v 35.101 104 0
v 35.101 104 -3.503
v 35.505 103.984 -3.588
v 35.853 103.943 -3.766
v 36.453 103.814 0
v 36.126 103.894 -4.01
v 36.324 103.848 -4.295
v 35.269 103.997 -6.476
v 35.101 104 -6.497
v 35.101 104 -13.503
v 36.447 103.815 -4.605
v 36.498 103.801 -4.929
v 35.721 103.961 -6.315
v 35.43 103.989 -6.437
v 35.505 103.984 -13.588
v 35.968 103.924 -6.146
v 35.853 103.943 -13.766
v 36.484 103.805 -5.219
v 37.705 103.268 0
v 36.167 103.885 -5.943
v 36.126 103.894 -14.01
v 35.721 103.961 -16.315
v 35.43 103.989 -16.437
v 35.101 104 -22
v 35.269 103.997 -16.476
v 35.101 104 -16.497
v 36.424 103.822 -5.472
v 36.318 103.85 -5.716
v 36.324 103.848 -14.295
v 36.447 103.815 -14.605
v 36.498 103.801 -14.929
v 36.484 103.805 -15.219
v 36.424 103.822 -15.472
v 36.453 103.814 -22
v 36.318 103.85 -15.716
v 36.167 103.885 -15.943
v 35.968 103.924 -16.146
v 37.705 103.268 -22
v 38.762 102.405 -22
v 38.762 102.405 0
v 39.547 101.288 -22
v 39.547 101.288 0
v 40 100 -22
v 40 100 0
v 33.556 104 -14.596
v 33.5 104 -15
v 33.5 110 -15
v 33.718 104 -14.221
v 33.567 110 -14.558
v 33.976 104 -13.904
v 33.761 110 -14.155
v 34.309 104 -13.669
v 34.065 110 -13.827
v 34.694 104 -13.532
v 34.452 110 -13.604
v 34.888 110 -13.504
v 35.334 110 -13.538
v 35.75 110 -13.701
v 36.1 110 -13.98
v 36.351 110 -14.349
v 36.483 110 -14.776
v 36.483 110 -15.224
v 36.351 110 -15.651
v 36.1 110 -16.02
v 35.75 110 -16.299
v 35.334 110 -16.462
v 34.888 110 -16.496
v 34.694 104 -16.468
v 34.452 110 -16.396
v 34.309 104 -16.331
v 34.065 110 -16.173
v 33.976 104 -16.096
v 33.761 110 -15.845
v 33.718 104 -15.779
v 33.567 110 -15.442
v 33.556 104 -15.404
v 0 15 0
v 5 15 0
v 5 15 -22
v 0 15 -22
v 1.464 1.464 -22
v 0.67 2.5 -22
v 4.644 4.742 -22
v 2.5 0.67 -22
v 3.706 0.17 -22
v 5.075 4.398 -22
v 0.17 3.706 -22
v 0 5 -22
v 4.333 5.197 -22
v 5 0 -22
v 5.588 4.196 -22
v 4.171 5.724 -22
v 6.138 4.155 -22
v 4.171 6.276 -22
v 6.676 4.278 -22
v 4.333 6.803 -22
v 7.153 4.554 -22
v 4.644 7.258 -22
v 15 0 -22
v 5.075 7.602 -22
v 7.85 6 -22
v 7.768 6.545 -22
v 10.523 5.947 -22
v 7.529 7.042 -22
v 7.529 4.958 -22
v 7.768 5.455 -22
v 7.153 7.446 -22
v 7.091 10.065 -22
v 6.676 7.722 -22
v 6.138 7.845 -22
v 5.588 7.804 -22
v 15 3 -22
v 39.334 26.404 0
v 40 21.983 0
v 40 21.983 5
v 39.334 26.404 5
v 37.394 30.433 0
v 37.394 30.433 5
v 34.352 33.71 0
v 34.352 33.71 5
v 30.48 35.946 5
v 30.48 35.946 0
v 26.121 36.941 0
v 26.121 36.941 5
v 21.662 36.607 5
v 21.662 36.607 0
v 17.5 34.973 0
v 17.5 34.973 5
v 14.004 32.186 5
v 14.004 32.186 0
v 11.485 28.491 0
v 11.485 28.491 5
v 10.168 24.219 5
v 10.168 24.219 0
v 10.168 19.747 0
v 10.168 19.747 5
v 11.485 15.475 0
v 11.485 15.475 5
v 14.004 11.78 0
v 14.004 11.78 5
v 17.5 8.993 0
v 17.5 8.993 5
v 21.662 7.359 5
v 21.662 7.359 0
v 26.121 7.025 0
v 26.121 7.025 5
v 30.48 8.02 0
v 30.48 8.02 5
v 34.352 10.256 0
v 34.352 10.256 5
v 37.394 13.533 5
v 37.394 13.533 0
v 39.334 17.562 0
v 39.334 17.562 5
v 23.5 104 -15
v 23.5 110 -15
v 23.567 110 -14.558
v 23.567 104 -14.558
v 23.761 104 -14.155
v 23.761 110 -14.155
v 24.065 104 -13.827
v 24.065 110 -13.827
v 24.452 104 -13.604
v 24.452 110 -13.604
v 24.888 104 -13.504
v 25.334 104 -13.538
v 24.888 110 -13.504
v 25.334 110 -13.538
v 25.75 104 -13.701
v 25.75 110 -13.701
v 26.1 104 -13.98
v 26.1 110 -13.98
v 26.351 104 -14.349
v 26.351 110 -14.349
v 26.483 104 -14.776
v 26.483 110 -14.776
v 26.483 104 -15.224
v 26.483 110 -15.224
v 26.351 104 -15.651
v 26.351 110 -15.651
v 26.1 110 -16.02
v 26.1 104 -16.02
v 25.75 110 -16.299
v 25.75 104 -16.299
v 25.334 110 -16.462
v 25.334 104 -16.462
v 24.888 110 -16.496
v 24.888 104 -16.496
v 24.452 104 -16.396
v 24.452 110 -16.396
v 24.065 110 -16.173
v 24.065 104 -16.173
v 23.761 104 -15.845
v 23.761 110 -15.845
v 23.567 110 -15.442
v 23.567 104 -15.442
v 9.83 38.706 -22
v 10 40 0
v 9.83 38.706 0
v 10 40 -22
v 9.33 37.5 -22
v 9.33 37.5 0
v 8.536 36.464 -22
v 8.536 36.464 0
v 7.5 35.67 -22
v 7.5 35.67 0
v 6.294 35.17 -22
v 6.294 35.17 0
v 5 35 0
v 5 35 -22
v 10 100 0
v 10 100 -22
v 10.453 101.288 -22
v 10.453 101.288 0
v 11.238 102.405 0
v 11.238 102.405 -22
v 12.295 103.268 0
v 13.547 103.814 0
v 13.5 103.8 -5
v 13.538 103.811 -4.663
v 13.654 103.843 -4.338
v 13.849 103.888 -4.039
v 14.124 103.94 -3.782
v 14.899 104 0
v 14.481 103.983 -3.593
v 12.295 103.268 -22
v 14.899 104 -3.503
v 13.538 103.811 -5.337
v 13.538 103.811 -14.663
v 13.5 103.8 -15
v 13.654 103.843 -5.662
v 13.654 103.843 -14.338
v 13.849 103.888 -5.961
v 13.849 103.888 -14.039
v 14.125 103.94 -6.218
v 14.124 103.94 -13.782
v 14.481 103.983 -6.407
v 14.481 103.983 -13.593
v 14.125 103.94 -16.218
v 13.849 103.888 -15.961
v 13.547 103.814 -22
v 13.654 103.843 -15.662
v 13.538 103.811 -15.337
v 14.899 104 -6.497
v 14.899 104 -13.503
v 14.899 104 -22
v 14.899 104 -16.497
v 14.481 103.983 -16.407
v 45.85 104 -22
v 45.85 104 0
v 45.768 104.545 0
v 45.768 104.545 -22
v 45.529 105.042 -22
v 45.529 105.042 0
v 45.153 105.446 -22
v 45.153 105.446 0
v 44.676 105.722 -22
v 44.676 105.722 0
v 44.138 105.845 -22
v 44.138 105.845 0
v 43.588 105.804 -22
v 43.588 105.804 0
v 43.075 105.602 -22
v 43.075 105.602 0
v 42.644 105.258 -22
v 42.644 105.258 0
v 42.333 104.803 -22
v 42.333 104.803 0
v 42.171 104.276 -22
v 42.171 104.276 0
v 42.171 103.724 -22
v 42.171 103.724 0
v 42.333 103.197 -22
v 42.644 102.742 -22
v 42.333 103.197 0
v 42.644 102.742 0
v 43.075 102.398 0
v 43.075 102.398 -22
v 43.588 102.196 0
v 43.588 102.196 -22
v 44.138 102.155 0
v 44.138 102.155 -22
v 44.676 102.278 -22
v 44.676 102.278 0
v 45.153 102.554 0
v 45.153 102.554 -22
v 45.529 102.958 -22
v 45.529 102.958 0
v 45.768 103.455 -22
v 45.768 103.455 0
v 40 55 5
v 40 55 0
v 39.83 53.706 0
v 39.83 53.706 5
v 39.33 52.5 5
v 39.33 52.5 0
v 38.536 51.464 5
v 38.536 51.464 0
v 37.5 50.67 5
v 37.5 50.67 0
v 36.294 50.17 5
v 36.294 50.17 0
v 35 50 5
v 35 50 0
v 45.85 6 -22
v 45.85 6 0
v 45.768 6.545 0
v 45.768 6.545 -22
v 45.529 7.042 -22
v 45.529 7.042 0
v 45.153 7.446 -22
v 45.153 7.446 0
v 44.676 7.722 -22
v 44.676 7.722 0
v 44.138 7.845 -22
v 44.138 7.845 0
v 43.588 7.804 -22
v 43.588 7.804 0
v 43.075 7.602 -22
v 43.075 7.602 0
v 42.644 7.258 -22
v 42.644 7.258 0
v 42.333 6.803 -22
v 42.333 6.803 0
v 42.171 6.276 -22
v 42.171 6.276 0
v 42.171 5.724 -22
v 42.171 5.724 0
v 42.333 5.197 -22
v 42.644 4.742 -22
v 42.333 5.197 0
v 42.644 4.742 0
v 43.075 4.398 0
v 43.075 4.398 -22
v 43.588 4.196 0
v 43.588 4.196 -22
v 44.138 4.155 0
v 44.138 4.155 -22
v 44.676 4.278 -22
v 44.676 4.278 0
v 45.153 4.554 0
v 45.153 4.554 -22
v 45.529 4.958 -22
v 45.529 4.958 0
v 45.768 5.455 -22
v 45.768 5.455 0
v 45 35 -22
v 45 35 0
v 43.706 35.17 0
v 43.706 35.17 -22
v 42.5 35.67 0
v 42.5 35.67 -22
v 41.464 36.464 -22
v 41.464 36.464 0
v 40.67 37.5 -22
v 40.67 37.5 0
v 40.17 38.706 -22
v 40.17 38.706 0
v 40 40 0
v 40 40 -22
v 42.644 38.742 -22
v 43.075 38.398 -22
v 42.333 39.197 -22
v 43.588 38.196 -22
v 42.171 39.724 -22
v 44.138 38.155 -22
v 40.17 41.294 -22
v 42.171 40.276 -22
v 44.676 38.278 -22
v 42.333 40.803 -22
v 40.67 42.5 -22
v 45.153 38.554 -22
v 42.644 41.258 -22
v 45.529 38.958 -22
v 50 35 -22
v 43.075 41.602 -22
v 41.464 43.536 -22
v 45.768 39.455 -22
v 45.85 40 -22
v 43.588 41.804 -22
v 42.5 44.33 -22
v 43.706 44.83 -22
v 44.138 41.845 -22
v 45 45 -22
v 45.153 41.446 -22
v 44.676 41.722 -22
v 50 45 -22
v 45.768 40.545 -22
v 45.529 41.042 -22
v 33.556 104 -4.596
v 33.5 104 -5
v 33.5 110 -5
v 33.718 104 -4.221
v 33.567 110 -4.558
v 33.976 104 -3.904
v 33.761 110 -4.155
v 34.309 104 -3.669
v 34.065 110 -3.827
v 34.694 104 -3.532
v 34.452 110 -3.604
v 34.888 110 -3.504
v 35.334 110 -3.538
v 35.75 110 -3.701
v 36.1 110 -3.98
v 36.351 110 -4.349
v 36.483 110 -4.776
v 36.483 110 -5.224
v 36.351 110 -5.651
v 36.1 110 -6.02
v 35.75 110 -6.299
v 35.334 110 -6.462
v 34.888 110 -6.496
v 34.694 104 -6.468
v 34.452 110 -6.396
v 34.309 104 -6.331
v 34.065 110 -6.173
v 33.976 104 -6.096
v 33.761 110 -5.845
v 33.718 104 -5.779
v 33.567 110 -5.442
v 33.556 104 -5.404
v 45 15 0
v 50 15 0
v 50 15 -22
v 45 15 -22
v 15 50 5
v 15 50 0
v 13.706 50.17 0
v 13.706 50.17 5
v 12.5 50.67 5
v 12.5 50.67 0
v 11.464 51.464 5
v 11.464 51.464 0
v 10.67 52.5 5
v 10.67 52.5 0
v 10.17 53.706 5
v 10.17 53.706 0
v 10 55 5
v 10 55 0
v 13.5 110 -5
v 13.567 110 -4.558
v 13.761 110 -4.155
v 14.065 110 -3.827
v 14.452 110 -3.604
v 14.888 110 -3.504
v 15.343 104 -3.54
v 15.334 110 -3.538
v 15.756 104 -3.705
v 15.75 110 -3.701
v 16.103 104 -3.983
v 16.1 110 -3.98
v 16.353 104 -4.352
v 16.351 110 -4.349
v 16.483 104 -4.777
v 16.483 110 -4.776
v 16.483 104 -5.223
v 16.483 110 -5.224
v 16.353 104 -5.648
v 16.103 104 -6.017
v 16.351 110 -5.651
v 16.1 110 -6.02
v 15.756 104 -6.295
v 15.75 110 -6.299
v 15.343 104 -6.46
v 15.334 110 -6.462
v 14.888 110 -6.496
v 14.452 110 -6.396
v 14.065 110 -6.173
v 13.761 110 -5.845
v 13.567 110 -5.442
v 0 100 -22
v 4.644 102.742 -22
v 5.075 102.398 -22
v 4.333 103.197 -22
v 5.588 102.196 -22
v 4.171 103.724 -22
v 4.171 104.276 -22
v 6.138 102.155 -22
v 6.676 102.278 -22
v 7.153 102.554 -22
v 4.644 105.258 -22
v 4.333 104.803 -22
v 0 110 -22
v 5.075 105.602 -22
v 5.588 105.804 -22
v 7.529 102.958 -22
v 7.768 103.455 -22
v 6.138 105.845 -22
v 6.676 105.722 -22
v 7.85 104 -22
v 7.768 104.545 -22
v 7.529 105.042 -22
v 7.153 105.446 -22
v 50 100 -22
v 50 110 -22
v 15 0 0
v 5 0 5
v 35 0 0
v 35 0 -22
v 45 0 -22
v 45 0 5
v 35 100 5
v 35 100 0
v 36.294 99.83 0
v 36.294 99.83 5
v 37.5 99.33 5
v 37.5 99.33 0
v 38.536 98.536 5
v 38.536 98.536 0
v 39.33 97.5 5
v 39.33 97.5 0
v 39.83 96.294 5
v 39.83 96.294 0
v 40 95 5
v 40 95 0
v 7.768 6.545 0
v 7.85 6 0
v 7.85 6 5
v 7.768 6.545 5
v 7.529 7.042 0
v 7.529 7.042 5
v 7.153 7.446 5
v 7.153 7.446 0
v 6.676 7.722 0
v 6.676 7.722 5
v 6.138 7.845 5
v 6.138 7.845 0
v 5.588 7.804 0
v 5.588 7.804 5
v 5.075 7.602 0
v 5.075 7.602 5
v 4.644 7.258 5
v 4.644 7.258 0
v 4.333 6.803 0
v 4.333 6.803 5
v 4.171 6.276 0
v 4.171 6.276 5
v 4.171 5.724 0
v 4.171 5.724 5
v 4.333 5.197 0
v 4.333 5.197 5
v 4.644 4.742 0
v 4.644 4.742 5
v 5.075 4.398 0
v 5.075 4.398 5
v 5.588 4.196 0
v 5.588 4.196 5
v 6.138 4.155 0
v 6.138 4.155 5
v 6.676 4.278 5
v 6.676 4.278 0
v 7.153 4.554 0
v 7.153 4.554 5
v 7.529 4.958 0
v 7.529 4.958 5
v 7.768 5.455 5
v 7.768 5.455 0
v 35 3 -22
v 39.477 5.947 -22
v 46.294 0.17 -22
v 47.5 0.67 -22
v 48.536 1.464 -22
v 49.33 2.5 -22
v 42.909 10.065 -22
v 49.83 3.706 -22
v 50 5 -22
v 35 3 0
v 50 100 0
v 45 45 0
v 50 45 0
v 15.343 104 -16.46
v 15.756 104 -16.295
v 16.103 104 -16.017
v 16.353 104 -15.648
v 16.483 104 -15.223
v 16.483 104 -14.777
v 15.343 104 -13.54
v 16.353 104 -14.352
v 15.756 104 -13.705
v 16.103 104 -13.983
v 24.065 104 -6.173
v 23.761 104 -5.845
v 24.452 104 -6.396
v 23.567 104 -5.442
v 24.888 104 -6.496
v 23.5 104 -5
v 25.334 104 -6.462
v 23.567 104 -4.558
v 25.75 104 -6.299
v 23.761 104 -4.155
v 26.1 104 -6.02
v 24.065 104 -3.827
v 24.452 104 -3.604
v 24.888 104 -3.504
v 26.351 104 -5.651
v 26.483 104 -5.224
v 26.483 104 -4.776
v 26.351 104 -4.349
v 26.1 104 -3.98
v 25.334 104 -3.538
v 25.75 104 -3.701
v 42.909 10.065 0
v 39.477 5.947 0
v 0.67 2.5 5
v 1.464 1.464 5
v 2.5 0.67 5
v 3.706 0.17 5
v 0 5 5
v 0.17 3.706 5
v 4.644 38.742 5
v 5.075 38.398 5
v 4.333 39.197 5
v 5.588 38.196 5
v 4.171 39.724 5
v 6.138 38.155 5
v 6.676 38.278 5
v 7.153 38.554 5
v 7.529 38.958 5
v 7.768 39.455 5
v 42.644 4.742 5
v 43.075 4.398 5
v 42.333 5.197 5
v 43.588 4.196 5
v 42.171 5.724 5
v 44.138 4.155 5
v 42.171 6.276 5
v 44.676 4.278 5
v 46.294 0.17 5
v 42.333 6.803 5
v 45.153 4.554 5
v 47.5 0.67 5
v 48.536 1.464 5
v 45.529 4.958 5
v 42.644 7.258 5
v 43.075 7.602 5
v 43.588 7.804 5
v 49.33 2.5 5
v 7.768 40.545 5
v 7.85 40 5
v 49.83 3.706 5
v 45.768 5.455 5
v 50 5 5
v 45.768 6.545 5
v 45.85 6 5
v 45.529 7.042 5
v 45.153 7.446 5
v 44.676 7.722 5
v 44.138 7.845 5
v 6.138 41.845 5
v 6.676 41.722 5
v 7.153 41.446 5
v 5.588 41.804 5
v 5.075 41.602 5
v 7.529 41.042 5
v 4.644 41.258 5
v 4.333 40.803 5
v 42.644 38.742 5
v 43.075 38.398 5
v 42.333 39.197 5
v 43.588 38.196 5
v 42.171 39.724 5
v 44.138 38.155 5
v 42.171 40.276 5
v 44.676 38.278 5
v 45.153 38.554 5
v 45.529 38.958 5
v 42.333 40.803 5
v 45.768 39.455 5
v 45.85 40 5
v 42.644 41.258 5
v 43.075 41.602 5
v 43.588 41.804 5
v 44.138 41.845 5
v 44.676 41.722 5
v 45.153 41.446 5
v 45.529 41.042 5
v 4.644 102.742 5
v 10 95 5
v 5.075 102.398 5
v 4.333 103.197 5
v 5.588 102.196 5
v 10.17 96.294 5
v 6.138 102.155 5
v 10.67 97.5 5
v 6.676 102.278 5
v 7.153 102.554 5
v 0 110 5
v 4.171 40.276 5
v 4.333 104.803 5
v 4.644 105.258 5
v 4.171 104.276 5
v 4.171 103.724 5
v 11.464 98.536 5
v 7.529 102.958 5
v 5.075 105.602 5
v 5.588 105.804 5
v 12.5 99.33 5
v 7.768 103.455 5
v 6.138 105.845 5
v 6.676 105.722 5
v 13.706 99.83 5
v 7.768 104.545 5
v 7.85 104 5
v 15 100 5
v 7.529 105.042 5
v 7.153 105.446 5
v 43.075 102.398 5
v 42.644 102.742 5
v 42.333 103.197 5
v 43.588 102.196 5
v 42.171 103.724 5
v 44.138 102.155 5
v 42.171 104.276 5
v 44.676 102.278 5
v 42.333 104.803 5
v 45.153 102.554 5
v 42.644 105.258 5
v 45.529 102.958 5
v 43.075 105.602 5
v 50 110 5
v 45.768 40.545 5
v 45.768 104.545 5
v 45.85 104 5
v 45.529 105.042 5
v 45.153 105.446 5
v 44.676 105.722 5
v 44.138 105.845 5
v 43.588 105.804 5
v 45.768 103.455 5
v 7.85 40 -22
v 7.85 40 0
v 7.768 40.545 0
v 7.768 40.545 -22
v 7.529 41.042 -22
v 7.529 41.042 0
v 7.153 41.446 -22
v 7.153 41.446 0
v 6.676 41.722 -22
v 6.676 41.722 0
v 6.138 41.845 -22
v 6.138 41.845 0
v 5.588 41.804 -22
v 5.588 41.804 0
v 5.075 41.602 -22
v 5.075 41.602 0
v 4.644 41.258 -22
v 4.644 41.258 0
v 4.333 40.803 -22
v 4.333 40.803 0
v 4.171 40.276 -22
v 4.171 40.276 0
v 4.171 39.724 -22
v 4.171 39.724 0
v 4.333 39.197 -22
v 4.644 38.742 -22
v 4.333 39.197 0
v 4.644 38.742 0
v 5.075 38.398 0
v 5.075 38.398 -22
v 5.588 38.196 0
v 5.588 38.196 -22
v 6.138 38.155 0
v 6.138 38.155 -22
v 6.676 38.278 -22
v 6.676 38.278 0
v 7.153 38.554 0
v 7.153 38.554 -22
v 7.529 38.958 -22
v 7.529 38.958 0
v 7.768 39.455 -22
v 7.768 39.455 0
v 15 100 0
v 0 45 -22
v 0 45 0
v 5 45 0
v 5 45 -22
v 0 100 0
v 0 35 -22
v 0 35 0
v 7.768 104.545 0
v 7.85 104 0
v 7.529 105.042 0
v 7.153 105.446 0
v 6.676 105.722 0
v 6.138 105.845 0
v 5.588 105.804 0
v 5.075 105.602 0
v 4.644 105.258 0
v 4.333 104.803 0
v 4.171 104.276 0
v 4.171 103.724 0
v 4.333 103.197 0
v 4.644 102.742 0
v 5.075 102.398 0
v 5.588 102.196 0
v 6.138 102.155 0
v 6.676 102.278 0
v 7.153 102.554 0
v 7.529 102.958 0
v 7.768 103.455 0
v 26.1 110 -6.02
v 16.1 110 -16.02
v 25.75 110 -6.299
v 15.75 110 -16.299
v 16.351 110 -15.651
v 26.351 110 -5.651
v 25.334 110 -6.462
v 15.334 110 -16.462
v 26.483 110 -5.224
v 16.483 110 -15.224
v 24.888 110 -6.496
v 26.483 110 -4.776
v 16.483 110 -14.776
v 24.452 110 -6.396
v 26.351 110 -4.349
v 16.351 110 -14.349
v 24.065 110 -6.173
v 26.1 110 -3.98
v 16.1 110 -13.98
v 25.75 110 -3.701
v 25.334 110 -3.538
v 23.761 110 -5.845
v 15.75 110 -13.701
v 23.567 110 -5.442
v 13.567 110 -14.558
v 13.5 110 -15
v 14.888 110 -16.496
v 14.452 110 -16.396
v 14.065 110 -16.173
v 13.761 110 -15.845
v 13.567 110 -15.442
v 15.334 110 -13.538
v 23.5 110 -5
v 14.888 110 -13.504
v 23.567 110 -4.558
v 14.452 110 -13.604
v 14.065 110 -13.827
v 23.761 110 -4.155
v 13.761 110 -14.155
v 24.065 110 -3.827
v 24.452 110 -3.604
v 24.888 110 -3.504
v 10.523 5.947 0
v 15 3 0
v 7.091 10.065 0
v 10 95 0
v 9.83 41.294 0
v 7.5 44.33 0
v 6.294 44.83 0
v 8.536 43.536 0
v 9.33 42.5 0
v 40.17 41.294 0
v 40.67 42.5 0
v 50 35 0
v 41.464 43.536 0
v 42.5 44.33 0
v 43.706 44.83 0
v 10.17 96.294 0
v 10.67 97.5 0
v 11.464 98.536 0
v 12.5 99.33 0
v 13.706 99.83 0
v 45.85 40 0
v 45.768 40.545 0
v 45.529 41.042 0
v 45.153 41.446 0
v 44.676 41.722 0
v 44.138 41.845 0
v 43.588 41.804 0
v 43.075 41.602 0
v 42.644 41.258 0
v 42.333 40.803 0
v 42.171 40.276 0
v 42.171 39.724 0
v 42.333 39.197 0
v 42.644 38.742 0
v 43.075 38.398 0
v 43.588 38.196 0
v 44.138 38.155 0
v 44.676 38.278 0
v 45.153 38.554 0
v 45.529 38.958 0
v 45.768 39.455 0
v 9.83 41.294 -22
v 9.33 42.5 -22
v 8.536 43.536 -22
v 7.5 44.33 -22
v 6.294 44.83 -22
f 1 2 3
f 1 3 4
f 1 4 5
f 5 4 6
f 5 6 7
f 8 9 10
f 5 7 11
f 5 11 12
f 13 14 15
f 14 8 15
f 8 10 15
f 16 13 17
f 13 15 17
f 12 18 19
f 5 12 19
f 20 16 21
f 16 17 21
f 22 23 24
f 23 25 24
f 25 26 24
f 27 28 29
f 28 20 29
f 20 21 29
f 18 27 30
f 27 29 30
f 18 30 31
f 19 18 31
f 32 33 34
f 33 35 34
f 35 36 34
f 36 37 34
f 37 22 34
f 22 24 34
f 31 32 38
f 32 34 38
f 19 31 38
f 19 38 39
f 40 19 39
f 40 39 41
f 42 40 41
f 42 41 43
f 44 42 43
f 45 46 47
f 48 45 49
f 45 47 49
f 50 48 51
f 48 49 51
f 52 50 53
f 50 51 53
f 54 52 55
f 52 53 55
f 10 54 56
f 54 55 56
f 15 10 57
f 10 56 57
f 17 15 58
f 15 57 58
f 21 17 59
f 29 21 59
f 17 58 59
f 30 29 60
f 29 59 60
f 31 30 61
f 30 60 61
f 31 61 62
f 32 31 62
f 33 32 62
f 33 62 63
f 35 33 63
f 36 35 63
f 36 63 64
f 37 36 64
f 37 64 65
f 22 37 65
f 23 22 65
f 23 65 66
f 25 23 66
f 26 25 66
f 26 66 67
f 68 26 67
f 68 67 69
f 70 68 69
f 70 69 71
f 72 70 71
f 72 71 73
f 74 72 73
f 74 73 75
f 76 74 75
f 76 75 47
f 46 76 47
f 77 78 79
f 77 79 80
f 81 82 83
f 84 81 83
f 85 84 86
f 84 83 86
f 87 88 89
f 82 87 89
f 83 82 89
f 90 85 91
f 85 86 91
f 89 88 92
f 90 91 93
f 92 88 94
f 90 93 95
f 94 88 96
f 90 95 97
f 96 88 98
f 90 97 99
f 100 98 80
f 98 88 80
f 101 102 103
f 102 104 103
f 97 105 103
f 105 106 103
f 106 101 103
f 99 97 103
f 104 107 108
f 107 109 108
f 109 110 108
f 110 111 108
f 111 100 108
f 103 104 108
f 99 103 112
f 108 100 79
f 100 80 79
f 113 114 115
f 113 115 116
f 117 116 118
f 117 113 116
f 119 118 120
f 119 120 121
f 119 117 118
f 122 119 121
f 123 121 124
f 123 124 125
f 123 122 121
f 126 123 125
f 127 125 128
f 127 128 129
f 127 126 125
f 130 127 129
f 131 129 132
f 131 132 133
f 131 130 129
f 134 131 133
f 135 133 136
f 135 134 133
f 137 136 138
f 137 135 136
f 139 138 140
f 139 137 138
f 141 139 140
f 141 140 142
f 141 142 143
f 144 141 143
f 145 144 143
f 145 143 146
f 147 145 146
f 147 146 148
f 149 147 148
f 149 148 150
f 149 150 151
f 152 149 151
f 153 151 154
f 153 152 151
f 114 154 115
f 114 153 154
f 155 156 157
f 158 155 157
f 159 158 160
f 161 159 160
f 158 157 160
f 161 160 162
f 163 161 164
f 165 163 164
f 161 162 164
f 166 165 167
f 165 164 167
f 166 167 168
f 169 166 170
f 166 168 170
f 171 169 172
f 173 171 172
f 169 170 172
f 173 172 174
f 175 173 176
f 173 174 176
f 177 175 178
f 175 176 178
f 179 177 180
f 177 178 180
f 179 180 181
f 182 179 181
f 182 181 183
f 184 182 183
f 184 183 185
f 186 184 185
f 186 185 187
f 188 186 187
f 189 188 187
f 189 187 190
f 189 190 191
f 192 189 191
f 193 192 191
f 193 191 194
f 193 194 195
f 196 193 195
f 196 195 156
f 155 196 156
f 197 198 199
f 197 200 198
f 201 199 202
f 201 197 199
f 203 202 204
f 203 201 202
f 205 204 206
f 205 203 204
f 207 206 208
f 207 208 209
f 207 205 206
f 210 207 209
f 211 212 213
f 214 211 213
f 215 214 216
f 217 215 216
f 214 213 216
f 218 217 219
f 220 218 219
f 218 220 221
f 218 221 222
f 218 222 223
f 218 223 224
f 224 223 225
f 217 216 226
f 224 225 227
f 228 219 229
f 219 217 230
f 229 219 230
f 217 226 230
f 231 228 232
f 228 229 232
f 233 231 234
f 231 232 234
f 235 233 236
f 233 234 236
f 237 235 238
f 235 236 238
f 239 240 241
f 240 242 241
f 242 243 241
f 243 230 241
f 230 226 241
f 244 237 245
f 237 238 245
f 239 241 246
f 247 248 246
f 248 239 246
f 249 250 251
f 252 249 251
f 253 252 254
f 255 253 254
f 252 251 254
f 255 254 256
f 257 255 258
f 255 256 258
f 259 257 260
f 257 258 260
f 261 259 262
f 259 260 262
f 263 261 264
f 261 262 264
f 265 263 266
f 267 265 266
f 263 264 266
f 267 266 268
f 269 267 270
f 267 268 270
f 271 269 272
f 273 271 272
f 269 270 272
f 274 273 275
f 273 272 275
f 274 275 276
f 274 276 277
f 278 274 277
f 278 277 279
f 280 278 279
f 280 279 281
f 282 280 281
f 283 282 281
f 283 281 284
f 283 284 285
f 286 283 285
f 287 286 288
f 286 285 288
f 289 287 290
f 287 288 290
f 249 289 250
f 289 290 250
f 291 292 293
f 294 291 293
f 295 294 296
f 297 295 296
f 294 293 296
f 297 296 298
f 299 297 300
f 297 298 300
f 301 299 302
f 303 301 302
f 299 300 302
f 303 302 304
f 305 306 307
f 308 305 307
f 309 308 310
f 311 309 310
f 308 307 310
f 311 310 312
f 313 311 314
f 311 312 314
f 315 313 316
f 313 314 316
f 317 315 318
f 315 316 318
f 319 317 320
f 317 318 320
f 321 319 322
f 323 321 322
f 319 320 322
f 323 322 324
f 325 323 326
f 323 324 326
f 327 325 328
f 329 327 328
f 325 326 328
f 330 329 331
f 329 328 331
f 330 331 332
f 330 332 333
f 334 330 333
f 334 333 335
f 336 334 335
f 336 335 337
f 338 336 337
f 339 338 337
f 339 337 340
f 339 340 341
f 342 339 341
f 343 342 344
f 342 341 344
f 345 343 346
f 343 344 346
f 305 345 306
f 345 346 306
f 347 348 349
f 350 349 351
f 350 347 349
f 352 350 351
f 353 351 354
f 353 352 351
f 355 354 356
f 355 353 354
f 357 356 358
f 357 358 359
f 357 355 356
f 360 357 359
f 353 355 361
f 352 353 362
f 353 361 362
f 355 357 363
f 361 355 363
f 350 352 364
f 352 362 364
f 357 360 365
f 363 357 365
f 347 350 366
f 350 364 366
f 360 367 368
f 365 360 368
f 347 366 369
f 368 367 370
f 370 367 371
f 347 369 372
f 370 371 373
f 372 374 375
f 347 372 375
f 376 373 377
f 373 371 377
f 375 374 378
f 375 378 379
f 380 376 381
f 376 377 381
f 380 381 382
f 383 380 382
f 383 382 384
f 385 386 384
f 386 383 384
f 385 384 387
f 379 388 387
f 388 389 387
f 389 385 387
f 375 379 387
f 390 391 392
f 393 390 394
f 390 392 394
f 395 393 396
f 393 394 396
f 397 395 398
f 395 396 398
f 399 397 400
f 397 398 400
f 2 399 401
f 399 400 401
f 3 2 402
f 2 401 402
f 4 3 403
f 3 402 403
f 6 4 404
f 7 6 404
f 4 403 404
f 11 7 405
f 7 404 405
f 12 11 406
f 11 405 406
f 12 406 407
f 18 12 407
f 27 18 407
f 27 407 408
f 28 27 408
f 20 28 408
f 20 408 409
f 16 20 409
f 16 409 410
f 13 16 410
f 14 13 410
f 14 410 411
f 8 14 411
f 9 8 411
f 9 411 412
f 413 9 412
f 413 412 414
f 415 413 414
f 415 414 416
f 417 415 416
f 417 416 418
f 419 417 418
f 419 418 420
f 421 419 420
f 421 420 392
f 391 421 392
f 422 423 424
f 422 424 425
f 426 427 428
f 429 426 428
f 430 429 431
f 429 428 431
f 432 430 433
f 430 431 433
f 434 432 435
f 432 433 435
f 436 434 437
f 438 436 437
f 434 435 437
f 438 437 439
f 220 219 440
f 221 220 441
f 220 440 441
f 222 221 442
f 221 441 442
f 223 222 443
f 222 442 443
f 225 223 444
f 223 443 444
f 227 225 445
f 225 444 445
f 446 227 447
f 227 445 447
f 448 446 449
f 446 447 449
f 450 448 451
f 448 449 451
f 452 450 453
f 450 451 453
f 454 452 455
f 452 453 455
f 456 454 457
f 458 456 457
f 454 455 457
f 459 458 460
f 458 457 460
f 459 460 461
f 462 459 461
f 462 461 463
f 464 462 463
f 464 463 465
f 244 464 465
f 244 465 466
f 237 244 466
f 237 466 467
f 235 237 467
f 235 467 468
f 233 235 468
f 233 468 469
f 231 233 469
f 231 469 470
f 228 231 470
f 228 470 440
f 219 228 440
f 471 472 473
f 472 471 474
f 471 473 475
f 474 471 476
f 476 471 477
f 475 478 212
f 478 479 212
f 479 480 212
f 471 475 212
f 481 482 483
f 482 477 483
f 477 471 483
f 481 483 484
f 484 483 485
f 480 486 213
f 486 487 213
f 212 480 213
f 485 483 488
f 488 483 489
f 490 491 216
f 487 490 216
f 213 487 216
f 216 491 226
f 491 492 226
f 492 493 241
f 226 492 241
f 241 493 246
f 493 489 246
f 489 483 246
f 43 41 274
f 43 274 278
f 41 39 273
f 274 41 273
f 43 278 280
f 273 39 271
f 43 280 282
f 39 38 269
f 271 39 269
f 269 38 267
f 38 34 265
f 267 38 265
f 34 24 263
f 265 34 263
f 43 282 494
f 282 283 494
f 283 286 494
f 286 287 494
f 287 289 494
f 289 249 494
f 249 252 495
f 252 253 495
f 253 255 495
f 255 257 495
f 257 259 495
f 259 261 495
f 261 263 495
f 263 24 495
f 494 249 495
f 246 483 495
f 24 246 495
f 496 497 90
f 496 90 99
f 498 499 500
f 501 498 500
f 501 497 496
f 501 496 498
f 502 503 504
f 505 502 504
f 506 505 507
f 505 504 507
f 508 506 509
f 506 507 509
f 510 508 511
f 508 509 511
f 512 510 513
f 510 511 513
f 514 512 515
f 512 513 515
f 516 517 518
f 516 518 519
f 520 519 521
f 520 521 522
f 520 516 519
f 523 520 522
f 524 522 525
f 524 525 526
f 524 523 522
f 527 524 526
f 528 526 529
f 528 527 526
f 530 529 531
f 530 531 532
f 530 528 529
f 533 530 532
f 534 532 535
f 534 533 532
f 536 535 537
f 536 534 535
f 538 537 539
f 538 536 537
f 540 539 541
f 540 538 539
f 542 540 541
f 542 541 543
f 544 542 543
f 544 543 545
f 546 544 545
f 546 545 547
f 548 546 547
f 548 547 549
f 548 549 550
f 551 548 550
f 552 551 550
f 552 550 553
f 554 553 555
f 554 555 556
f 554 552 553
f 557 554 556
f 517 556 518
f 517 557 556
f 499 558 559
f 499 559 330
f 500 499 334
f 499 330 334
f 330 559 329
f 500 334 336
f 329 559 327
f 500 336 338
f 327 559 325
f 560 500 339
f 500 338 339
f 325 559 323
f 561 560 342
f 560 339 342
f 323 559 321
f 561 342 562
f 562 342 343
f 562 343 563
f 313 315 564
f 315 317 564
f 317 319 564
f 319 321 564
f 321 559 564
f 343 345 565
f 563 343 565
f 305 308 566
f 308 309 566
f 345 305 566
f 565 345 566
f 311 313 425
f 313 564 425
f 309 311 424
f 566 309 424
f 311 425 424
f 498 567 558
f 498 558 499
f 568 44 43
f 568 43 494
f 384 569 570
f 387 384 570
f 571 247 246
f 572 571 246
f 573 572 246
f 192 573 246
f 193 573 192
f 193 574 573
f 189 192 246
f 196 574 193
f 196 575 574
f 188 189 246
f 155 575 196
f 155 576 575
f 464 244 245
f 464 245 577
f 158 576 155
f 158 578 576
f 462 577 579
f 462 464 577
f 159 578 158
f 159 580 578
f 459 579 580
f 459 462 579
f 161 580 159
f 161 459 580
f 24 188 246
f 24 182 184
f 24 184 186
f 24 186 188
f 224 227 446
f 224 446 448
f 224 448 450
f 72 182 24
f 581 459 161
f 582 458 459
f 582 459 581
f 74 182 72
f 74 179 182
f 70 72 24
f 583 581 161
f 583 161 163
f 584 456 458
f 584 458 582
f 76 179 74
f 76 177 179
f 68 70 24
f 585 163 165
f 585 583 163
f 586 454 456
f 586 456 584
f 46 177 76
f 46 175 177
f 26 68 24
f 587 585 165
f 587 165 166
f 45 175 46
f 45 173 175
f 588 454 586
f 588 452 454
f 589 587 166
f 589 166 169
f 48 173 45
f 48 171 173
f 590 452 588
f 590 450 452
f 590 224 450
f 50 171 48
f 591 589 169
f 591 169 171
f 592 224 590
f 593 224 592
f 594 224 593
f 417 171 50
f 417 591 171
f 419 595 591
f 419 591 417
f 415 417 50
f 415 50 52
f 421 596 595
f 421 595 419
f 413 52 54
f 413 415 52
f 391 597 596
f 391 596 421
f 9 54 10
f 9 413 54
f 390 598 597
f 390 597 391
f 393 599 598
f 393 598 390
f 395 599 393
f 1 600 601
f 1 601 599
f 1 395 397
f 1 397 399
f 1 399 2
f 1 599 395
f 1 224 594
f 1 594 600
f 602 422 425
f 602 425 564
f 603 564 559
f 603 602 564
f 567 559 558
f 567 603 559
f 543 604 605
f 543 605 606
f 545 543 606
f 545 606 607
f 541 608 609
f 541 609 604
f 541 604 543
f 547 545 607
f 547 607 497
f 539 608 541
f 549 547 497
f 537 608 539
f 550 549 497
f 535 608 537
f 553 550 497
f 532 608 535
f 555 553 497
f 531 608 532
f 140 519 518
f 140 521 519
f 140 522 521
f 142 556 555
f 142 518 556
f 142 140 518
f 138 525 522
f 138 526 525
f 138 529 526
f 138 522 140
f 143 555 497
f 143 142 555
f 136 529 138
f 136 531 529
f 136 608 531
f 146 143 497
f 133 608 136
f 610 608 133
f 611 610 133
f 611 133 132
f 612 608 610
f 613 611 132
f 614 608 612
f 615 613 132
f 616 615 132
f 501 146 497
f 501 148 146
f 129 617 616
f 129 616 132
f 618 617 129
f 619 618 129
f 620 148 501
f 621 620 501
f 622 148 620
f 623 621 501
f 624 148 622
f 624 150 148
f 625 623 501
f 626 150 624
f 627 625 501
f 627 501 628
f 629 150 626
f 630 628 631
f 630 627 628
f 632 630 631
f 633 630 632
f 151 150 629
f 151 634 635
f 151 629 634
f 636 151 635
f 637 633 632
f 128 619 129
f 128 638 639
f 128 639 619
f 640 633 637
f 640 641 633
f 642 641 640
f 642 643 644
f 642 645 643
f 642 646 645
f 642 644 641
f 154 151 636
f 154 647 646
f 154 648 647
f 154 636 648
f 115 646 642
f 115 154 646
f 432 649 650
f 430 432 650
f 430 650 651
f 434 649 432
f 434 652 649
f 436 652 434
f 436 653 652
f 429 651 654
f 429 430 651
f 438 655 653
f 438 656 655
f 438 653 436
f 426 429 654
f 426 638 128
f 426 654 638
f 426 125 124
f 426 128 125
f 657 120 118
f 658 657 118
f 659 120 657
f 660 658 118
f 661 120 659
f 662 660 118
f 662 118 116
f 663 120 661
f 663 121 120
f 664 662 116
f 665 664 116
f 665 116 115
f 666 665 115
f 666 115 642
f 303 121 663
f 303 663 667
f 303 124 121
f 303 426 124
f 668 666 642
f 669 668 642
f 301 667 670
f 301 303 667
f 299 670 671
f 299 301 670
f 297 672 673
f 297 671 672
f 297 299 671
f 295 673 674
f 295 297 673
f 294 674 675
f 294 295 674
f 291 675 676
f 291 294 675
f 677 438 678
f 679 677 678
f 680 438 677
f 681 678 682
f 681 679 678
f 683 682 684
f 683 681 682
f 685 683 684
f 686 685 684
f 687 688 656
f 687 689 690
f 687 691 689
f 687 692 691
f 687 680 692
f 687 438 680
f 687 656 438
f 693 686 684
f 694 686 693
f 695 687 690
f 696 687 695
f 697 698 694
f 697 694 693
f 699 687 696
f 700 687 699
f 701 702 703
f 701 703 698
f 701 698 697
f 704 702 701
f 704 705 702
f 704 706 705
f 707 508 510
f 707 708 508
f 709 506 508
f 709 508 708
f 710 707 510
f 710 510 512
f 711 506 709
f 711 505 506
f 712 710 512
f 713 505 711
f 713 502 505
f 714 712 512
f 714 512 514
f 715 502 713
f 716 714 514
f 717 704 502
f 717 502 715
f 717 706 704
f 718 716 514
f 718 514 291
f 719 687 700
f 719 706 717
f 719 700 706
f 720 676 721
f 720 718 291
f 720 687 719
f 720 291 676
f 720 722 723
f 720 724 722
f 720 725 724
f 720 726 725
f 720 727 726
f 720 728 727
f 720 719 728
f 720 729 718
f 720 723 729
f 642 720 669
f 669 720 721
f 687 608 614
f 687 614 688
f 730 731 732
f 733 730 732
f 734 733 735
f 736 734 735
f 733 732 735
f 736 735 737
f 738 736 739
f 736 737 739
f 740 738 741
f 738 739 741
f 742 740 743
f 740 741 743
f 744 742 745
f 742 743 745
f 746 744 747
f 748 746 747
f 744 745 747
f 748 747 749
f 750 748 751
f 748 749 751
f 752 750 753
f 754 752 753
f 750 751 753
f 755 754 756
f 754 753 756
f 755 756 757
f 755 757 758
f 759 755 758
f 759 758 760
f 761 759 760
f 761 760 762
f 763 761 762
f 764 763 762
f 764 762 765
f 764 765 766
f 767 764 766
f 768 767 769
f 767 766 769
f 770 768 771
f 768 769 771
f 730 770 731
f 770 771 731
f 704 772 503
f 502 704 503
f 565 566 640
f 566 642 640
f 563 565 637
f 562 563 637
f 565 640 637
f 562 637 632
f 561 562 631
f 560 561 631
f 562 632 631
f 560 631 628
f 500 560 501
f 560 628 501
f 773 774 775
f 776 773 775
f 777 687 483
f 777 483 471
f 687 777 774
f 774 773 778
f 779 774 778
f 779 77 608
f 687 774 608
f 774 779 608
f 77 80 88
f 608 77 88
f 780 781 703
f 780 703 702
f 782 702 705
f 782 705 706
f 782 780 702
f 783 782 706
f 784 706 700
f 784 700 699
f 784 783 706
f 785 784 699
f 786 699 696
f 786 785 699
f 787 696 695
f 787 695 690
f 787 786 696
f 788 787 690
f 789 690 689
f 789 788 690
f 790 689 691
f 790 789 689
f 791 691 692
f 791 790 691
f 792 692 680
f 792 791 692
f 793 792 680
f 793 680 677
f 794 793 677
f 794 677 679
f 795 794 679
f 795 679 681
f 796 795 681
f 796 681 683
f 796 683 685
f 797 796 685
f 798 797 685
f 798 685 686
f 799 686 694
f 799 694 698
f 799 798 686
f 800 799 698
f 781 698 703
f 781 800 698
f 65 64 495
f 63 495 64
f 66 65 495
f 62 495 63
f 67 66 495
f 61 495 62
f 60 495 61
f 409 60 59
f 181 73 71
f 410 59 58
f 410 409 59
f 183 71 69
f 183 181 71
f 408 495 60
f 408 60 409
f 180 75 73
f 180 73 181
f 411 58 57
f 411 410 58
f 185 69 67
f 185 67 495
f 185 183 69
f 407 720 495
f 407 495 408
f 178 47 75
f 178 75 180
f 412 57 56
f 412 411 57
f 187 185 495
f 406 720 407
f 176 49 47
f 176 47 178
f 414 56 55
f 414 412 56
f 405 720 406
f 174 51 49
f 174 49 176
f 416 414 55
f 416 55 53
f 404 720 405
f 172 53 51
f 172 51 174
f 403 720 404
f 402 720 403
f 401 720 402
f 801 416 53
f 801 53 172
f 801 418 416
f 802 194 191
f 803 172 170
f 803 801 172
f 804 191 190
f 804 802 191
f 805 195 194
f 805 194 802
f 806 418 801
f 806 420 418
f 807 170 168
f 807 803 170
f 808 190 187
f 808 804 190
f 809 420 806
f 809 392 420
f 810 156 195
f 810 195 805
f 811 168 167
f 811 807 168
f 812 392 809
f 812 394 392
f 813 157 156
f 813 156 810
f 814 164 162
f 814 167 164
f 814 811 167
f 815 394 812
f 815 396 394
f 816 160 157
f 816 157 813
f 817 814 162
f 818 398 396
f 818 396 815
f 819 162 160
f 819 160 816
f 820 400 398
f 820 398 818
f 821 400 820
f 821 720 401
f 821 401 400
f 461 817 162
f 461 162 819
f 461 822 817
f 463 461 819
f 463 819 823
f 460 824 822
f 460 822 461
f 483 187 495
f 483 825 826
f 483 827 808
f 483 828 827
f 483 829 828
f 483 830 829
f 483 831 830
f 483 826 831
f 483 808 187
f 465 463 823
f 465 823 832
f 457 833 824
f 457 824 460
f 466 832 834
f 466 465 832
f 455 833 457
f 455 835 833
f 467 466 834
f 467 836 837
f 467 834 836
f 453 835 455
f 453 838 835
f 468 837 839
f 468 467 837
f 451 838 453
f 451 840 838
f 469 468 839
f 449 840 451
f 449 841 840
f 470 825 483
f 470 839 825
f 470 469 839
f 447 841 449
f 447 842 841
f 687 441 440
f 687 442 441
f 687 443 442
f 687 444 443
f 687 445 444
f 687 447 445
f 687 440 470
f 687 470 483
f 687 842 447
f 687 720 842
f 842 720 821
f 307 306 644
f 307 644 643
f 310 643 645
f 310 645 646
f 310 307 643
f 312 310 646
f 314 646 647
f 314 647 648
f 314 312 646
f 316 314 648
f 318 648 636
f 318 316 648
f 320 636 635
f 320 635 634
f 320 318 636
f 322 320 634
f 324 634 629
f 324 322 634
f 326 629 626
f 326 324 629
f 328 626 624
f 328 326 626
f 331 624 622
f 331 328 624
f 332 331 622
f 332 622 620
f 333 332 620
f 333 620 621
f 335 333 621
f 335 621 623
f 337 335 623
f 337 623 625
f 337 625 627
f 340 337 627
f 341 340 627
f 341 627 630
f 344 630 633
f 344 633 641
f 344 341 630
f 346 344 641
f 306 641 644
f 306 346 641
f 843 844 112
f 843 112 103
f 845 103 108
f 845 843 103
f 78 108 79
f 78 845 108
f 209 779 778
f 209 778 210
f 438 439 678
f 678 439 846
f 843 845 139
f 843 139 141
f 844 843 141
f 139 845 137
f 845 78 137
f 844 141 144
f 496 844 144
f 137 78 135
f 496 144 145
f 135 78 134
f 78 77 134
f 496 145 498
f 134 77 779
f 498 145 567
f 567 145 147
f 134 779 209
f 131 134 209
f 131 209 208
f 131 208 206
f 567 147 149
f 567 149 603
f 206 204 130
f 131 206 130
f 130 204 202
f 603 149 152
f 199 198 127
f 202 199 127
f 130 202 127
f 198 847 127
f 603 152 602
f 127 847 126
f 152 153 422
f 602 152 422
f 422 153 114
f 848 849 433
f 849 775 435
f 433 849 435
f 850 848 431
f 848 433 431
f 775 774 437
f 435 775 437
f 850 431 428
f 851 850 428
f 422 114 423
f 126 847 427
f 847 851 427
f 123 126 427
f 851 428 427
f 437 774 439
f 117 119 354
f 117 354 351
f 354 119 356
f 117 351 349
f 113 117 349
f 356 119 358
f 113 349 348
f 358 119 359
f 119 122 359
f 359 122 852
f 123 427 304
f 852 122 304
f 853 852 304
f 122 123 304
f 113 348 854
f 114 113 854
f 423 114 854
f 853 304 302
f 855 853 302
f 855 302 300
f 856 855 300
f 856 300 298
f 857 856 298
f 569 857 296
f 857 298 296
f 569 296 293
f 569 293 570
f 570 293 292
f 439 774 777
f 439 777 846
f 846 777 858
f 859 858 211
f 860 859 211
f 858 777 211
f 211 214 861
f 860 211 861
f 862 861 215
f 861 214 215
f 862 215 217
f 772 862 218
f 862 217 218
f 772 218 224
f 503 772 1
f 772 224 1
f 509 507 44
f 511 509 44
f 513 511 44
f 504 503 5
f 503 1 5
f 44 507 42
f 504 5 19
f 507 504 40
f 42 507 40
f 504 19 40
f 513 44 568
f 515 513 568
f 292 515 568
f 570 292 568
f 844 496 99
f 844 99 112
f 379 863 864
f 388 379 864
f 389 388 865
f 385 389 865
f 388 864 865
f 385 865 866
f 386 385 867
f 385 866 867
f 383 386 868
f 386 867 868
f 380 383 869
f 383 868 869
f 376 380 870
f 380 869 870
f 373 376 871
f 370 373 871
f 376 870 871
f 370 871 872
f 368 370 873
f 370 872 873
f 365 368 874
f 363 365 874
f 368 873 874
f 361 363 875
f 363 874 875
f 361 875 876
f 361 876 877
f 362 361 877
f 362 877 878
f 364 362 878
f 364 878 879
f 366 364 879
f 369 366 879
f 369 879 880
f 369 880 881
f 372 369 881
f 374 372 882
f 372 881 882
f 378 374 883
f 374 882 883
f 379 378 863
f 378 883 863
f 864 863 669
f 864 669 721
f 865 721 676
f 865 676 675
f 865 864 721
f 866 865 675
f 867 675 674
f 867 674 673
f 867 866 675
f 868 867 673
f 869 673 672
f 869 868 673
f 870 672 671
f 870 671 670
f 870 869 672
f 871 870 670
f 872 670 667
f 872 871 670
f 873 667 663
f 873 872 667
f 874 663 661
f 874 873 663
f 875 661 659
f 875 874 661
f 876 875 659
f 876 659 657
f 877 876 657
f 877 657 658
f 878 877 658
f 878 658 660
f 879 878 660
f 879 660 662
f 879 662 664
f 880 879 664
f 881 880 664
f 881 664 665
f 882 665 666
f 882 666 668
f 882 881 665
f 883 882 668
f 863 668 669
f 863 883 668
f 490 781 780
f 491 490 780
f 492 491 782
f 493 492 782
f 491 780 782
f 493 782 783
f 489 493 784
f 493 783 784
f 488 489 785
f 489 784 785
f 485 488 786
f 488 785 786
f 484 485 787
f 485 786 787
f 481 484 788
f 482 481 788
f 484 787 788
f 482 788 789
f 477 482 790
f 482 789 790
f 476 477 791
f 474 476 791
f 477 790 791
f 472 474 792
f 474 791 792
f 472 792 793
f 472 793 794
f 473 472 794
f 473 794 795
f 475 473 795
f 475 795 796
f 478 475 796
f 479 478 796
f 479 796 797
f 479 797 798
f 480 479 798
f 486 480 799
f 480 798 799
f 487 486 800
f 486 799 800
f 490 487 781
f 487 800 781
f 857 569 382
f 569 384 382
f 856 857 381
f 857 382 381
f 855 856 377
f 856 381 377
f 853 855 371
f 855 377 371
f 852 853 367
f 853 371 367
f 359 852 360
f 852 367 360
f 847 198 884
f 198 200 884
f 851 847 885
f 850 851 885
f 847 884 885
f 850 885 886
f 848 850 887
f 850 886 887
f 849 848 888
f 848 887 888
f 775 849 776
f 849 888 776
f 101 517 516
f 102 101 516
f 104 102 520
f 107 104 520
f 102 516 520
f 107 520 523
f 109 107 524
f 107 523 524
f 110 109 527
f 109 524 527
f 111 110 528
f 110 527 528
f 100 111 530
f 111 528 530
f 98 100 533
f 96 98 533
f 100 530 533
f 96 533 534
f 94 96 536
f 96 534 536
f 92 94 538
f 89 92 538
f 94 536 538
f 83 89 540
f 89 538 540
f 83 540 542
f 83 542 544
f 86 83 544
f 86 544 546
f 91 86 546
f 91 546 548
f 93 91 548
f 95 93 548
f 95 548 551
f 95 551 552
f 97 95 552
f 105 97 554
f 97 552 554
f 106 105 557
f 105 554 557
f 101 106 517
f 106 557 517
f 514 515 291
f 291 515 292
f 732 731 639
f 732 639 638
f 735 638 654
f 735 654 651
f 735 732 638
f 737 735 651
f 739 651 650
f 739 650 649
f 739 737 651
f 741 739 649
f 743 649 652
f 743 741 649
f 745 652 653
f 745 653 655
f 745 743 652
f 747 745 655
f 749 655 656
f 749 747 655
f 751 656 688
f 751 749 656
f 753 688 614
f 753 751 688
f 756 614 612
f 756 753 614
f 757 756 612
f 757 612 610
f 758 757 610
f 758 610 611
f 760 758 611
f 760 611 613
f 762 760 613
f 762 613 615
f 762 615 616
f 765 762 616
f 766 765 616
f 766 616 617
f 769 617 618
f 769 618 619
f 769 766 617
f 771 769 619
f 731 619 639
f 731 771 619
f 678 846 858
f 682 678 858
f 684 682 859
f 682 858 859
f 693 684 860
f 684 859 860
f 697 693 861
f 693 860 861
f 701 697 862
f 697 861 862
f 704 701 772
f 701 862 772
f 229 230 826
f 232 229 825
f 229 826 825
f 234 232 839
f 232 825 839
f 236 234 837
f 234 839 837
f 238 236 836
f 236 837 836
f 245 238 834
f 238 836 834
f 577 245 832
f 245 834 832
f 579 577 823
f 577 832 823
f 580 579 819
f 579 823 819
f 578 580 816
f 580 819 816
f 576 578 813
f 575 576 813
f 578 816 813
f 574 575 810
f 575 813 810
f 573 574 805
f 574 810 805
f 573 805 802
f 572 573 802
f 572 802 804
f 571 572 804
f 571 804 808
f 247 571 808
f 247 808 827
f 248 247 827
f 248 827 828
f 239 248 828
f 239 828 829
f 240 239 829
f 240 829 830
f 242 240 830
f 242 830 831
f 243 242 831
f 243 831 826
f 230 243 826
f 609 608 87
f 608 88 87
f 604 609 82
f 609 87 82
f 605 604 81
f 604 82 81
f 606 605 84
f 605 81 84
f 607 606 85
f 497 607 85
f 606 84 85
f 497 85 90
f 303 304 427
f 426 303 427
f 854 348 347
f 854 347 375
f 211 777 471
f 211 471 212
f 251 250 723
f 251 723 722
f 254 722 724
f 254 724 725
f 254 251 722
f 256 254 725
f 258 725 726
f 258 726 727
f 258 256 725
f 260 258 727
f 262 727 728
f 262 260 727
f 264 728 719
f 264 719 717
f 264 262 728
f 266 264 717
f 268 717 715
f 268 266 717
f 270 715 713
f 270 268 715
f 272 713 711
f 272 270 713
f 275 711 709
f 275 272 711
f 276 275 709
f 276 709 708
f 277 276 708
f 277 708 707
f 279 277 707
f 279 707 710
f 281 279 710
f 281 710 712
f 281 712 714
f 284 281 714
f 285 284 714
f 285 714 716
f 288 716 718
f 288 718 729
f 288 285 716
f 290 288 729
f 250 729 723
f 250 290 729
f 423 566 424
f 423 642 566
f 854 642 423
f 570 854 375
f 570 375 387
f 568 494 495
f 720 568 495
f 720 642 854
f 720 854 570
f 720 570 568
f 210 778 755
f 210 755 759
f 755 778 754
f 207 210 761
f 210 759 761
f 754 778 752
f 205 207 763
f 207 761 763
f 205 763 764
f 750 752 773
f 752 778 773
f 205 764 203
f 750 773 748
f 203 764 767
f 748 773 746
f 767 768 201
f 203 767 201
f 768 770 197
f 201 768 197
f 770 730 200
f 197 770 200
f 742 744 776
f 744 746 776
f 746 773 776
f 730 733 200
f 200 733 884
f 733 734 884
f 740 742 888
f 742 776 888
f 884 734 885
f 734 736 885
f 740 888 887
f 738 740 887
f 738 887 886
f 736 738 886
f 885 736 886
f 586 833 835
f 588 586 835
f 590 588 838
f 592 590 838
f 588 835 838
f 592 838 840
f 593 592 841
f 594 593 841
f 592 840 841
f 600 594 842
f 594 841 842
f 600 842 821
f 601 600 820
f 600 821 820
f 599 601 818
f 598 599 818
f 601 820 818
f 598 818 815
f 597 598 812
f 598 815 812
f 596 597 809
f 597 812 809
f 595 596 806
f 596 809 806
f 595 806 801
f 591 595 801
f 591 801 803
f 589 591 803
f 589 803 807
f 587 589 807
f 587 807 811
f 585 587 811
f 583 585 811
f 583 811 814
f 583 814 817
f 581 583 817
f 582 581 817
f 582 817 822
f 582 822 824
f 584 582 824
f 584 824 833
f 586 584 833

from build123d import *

# Parameters (mm, degrees)
F0_R        = 1.85
F0_R_2      = 15
F0_W        = 10
F0_H        = 10
F1_DEPTH    = 5
F2_DEPTH    = 22
F3_R        = 4.99999
F4_T1_DEPTH = 22
F5_R        = 1.5
F6_DEPTH    = 25


# Not quite as in the source:
# - a fillet or chamfer that OpenCascade refuses, or shapes differently, is made with other operations: its cross-section is extruded or revolved along the edge and cut away or added
# - a fillet or chamfer is up to 0.001 mm smaller than in the source, because OpenCascade refuses the exact size
# - a feature names something its author has since deleted; it is built from what else it names


with BuildPart() as f1:
    # F0 (on Top) → F1 (new body)
    with BuildSketch(Plane.XY):
        with BuildLine():
            Line((0, 15), (0, 0))
            Line((0, 0), (15, 0))
            Line((15, 0), (15, 3))
            ThreePointArc((15, 3), (8.6554793841, 7.8795661534), (5, 15))
            Line((5, 15), (0, 15))
        make_face()
        with Locations((6, 6)):
            Circle(F0_R, mode=Mode.SUBTRACT)
        with BuildLine():
            Line((15, 3), (15, 0))
            Line((15, 0), (35, 0))
            Line((35, 0), (35, 3))
            ThreePointArc((35, 3), (41.3445206159, 7.8795661534), (45, 15))
            Line((45, 15), (50, 15))
            Line((50, 15), (50, 35))
            Line((50, 35), (40, 35))
            Line((40, 35), (40, 45))
            Line((40, 45), (50, 45))
            Line((50, 45), (50, 100))
            Line((50, 100), (40, 100))
            Line((40, 100), (40, 104))
            Line((40, 104), (10, 104))
            Line((10, 104), (10, 100))
            Line((10, 100), (0, 100))
            Line((0, 100), (0, 45))
            Line((0, 45), (10, 45))
            Line((10, 45), (10, 35))
            Line((10, 35), (0, 35))
            Line((0, 35), (0, 15))
            Line((0, 15), (5, 15))
            ThreePointArc((5, 15), (8.6554793841, 7.8795661534), (15, 3))
        make_face()
        with Locations((25, 21.983)):
            Circle(F0_R_2, mode=Mode.SUBTRACT)
        with BuildLine():
            Line((15, 100), (35, 100))
            ThreePointArc((35, 100), (38.5355339059, 98.5355339059), (40, 95))
            Line((40, 95), (40, 55))
            ThreePointArc((40, 55), (38.5355339059, 51.4644660941), (35, 50))
            Line((35, 50), (15, 50))
            ThreePointArc((15, 50), (11.4644660941, 51.4644660941), (10, 55))
            Line((10, 55), (10, 95))
            ThreePointArc((10, 95), (11.4644660941, 98.5355339059), (15, 100))
        make_face(mode=Mode.SUBTRACT)
        with BuildLine():
            Line((35, 3), (35, 0))
            Line((35, 0), (50, 0))
            Line((50, 0), (50, 15))
            Line((50, 15), (45, 15))
            ThreePointArc((45, 15), (41.3445206159, 7.8795661534), (35, 3))
        make_face()
        with Locations((44, 6)):
            Circle(F0_R, mode=Mode.SUBTRACT)
        Polygon((0, 110), (0, 100), (10, 100), (10, 104), (40, 104), (40, 100), (50, 100), (50, 110), align=None)
        with Locations((6, 104)):
            Circle(F0_R, mode=Mode.SUBTRACT)
        with Locations((44, 104)):
            Circle(F0_R, mode=Mode.SUBTRACT)
        with Locations((5, 40)):
            Rectangle(F0_W, F0_H)
        with Locations((6, 40)):
            Circle(F0_R, mode=Mode.SUBTRACT)
        with Locations((45, 40)):
            Rectangle(F0_W, F0_H)
        with Locations((44, 40)):
            Circle(F0_R, mode=Mode.SUBTRACT)
    extrude(amount=F1_DEPTH)

    # F0 (on Top) → F2 (join)
    with BuildSketch(Plane.XY):
        with BuildLine():
            Line((35, 3), (35, 0))
            Line((35, 0), (50, 0))
            Line((50, 0), (50, 15))
            Line((50, 15), (45, 15))
            ThreePointArc((45, 15), (41.3445206159, 7.8795661534), (35, 3))
        make_face()
        with Locations((44, 6)):
            Circle(F0_R, mode=Mode.SUBTRACT)
        with BuildLine():
            Line((0, 15), (0, 0))
            Line((0, 0), (15, 0))
            Line((15, 0), (15, 3))
            ThreePointArc((15, 3), (8.6554793841, 7.8795661534), (5, 15))
            Line((5, 15), (0, 15))
        make_face()
        with Locations((6, 6)):
            Circle(F0_R, mode=Mode.SUBTRACT)
        with Locations((45, 40)):
            Rectangle(F0_W, F0_H)
        with Locations((44, 40)):
            Circle(F0_R, mode=Mode.SUBTRACT)
        with Locations((5, 40)):
            Rectangle(F0_W, F0_H)
        with Locations((6, 40)):
            Circle(F0_R, mode=Mode.SUBTRACT)
        Polygon((0, 110), (0, 100), (10, 100), (10, 104), (40, 104), (40, 100), (50, 100), (50, 110), align=None)
        with Locations((6, 104)):
            Circle(F0_R, mode=Mode.SUBTRACT)
        with Locations((44, 104)):
            Circle(F0_R, mode=Mode.SUBTRACT)
    extrude(amount=-F2_DEPTH)

    # F3 (radius 5 in the source; OpenCascade refuses exactly that, so slightly less here)
    f3_edges = [f1.edges().sort_by_distance(p)[0] for p in [
        (50, 0, -8.5),
        (0, 0, -8.5),
        (40, 35, -11),
        (40, 45, -11),
        (10, 35, -11),
        (10, 45, -11),
    ]]
    fillet(f3_edges, radius=F3_R)

    # F4: fillet of radius 5 on 2 edges, made by hand

    # F4_s2 → F4_t1 (join)
    with BuildSketch(Plane.XY.offset(-22)):
        with BuildLine():
            ThreePointArc((35.1010205144, 104), (38.2632981746, 102.8729833462), (40, 100))
            Line((40, 100), (40, 104))
            Line((40, 104), (35.1010205144, 104))
        make_face()
        with BuildLine():
            ThreePointArc((10, 100), (11.7367018254, 102.8729833462), (14.8989794856, 104))
            Line((14.8989794856, 104), (10, 104))
            Line((10, 104), (10, 100))
        make_face()
    extrude(amount=F4_T1_DEPTH)

    # F5 (on face) → F6 (cut)
    with BuildSketch(Plane(origin=(0, 110, 0), x_dir=(-1, 0, 0), z_dir=(0, 1, 0))):
        with Locations((-35, -15)):
            Circle(F5_R)
        with Locations((-35, -5)):
            Circle(F5_R)
        with Locations((-15, -5)):
            Circle(F5_R)
        with Locations((-15, -15)):
            Circle(F5_R)
        with Locations((-25, -15)):
            Circle(F5_R)
        with Locations((-25, -5)):
            Circle(F5_R)
    extrude(amount=-F6_DEPTH, mode=Mode.SUBTRACT)


solid = f1.part
